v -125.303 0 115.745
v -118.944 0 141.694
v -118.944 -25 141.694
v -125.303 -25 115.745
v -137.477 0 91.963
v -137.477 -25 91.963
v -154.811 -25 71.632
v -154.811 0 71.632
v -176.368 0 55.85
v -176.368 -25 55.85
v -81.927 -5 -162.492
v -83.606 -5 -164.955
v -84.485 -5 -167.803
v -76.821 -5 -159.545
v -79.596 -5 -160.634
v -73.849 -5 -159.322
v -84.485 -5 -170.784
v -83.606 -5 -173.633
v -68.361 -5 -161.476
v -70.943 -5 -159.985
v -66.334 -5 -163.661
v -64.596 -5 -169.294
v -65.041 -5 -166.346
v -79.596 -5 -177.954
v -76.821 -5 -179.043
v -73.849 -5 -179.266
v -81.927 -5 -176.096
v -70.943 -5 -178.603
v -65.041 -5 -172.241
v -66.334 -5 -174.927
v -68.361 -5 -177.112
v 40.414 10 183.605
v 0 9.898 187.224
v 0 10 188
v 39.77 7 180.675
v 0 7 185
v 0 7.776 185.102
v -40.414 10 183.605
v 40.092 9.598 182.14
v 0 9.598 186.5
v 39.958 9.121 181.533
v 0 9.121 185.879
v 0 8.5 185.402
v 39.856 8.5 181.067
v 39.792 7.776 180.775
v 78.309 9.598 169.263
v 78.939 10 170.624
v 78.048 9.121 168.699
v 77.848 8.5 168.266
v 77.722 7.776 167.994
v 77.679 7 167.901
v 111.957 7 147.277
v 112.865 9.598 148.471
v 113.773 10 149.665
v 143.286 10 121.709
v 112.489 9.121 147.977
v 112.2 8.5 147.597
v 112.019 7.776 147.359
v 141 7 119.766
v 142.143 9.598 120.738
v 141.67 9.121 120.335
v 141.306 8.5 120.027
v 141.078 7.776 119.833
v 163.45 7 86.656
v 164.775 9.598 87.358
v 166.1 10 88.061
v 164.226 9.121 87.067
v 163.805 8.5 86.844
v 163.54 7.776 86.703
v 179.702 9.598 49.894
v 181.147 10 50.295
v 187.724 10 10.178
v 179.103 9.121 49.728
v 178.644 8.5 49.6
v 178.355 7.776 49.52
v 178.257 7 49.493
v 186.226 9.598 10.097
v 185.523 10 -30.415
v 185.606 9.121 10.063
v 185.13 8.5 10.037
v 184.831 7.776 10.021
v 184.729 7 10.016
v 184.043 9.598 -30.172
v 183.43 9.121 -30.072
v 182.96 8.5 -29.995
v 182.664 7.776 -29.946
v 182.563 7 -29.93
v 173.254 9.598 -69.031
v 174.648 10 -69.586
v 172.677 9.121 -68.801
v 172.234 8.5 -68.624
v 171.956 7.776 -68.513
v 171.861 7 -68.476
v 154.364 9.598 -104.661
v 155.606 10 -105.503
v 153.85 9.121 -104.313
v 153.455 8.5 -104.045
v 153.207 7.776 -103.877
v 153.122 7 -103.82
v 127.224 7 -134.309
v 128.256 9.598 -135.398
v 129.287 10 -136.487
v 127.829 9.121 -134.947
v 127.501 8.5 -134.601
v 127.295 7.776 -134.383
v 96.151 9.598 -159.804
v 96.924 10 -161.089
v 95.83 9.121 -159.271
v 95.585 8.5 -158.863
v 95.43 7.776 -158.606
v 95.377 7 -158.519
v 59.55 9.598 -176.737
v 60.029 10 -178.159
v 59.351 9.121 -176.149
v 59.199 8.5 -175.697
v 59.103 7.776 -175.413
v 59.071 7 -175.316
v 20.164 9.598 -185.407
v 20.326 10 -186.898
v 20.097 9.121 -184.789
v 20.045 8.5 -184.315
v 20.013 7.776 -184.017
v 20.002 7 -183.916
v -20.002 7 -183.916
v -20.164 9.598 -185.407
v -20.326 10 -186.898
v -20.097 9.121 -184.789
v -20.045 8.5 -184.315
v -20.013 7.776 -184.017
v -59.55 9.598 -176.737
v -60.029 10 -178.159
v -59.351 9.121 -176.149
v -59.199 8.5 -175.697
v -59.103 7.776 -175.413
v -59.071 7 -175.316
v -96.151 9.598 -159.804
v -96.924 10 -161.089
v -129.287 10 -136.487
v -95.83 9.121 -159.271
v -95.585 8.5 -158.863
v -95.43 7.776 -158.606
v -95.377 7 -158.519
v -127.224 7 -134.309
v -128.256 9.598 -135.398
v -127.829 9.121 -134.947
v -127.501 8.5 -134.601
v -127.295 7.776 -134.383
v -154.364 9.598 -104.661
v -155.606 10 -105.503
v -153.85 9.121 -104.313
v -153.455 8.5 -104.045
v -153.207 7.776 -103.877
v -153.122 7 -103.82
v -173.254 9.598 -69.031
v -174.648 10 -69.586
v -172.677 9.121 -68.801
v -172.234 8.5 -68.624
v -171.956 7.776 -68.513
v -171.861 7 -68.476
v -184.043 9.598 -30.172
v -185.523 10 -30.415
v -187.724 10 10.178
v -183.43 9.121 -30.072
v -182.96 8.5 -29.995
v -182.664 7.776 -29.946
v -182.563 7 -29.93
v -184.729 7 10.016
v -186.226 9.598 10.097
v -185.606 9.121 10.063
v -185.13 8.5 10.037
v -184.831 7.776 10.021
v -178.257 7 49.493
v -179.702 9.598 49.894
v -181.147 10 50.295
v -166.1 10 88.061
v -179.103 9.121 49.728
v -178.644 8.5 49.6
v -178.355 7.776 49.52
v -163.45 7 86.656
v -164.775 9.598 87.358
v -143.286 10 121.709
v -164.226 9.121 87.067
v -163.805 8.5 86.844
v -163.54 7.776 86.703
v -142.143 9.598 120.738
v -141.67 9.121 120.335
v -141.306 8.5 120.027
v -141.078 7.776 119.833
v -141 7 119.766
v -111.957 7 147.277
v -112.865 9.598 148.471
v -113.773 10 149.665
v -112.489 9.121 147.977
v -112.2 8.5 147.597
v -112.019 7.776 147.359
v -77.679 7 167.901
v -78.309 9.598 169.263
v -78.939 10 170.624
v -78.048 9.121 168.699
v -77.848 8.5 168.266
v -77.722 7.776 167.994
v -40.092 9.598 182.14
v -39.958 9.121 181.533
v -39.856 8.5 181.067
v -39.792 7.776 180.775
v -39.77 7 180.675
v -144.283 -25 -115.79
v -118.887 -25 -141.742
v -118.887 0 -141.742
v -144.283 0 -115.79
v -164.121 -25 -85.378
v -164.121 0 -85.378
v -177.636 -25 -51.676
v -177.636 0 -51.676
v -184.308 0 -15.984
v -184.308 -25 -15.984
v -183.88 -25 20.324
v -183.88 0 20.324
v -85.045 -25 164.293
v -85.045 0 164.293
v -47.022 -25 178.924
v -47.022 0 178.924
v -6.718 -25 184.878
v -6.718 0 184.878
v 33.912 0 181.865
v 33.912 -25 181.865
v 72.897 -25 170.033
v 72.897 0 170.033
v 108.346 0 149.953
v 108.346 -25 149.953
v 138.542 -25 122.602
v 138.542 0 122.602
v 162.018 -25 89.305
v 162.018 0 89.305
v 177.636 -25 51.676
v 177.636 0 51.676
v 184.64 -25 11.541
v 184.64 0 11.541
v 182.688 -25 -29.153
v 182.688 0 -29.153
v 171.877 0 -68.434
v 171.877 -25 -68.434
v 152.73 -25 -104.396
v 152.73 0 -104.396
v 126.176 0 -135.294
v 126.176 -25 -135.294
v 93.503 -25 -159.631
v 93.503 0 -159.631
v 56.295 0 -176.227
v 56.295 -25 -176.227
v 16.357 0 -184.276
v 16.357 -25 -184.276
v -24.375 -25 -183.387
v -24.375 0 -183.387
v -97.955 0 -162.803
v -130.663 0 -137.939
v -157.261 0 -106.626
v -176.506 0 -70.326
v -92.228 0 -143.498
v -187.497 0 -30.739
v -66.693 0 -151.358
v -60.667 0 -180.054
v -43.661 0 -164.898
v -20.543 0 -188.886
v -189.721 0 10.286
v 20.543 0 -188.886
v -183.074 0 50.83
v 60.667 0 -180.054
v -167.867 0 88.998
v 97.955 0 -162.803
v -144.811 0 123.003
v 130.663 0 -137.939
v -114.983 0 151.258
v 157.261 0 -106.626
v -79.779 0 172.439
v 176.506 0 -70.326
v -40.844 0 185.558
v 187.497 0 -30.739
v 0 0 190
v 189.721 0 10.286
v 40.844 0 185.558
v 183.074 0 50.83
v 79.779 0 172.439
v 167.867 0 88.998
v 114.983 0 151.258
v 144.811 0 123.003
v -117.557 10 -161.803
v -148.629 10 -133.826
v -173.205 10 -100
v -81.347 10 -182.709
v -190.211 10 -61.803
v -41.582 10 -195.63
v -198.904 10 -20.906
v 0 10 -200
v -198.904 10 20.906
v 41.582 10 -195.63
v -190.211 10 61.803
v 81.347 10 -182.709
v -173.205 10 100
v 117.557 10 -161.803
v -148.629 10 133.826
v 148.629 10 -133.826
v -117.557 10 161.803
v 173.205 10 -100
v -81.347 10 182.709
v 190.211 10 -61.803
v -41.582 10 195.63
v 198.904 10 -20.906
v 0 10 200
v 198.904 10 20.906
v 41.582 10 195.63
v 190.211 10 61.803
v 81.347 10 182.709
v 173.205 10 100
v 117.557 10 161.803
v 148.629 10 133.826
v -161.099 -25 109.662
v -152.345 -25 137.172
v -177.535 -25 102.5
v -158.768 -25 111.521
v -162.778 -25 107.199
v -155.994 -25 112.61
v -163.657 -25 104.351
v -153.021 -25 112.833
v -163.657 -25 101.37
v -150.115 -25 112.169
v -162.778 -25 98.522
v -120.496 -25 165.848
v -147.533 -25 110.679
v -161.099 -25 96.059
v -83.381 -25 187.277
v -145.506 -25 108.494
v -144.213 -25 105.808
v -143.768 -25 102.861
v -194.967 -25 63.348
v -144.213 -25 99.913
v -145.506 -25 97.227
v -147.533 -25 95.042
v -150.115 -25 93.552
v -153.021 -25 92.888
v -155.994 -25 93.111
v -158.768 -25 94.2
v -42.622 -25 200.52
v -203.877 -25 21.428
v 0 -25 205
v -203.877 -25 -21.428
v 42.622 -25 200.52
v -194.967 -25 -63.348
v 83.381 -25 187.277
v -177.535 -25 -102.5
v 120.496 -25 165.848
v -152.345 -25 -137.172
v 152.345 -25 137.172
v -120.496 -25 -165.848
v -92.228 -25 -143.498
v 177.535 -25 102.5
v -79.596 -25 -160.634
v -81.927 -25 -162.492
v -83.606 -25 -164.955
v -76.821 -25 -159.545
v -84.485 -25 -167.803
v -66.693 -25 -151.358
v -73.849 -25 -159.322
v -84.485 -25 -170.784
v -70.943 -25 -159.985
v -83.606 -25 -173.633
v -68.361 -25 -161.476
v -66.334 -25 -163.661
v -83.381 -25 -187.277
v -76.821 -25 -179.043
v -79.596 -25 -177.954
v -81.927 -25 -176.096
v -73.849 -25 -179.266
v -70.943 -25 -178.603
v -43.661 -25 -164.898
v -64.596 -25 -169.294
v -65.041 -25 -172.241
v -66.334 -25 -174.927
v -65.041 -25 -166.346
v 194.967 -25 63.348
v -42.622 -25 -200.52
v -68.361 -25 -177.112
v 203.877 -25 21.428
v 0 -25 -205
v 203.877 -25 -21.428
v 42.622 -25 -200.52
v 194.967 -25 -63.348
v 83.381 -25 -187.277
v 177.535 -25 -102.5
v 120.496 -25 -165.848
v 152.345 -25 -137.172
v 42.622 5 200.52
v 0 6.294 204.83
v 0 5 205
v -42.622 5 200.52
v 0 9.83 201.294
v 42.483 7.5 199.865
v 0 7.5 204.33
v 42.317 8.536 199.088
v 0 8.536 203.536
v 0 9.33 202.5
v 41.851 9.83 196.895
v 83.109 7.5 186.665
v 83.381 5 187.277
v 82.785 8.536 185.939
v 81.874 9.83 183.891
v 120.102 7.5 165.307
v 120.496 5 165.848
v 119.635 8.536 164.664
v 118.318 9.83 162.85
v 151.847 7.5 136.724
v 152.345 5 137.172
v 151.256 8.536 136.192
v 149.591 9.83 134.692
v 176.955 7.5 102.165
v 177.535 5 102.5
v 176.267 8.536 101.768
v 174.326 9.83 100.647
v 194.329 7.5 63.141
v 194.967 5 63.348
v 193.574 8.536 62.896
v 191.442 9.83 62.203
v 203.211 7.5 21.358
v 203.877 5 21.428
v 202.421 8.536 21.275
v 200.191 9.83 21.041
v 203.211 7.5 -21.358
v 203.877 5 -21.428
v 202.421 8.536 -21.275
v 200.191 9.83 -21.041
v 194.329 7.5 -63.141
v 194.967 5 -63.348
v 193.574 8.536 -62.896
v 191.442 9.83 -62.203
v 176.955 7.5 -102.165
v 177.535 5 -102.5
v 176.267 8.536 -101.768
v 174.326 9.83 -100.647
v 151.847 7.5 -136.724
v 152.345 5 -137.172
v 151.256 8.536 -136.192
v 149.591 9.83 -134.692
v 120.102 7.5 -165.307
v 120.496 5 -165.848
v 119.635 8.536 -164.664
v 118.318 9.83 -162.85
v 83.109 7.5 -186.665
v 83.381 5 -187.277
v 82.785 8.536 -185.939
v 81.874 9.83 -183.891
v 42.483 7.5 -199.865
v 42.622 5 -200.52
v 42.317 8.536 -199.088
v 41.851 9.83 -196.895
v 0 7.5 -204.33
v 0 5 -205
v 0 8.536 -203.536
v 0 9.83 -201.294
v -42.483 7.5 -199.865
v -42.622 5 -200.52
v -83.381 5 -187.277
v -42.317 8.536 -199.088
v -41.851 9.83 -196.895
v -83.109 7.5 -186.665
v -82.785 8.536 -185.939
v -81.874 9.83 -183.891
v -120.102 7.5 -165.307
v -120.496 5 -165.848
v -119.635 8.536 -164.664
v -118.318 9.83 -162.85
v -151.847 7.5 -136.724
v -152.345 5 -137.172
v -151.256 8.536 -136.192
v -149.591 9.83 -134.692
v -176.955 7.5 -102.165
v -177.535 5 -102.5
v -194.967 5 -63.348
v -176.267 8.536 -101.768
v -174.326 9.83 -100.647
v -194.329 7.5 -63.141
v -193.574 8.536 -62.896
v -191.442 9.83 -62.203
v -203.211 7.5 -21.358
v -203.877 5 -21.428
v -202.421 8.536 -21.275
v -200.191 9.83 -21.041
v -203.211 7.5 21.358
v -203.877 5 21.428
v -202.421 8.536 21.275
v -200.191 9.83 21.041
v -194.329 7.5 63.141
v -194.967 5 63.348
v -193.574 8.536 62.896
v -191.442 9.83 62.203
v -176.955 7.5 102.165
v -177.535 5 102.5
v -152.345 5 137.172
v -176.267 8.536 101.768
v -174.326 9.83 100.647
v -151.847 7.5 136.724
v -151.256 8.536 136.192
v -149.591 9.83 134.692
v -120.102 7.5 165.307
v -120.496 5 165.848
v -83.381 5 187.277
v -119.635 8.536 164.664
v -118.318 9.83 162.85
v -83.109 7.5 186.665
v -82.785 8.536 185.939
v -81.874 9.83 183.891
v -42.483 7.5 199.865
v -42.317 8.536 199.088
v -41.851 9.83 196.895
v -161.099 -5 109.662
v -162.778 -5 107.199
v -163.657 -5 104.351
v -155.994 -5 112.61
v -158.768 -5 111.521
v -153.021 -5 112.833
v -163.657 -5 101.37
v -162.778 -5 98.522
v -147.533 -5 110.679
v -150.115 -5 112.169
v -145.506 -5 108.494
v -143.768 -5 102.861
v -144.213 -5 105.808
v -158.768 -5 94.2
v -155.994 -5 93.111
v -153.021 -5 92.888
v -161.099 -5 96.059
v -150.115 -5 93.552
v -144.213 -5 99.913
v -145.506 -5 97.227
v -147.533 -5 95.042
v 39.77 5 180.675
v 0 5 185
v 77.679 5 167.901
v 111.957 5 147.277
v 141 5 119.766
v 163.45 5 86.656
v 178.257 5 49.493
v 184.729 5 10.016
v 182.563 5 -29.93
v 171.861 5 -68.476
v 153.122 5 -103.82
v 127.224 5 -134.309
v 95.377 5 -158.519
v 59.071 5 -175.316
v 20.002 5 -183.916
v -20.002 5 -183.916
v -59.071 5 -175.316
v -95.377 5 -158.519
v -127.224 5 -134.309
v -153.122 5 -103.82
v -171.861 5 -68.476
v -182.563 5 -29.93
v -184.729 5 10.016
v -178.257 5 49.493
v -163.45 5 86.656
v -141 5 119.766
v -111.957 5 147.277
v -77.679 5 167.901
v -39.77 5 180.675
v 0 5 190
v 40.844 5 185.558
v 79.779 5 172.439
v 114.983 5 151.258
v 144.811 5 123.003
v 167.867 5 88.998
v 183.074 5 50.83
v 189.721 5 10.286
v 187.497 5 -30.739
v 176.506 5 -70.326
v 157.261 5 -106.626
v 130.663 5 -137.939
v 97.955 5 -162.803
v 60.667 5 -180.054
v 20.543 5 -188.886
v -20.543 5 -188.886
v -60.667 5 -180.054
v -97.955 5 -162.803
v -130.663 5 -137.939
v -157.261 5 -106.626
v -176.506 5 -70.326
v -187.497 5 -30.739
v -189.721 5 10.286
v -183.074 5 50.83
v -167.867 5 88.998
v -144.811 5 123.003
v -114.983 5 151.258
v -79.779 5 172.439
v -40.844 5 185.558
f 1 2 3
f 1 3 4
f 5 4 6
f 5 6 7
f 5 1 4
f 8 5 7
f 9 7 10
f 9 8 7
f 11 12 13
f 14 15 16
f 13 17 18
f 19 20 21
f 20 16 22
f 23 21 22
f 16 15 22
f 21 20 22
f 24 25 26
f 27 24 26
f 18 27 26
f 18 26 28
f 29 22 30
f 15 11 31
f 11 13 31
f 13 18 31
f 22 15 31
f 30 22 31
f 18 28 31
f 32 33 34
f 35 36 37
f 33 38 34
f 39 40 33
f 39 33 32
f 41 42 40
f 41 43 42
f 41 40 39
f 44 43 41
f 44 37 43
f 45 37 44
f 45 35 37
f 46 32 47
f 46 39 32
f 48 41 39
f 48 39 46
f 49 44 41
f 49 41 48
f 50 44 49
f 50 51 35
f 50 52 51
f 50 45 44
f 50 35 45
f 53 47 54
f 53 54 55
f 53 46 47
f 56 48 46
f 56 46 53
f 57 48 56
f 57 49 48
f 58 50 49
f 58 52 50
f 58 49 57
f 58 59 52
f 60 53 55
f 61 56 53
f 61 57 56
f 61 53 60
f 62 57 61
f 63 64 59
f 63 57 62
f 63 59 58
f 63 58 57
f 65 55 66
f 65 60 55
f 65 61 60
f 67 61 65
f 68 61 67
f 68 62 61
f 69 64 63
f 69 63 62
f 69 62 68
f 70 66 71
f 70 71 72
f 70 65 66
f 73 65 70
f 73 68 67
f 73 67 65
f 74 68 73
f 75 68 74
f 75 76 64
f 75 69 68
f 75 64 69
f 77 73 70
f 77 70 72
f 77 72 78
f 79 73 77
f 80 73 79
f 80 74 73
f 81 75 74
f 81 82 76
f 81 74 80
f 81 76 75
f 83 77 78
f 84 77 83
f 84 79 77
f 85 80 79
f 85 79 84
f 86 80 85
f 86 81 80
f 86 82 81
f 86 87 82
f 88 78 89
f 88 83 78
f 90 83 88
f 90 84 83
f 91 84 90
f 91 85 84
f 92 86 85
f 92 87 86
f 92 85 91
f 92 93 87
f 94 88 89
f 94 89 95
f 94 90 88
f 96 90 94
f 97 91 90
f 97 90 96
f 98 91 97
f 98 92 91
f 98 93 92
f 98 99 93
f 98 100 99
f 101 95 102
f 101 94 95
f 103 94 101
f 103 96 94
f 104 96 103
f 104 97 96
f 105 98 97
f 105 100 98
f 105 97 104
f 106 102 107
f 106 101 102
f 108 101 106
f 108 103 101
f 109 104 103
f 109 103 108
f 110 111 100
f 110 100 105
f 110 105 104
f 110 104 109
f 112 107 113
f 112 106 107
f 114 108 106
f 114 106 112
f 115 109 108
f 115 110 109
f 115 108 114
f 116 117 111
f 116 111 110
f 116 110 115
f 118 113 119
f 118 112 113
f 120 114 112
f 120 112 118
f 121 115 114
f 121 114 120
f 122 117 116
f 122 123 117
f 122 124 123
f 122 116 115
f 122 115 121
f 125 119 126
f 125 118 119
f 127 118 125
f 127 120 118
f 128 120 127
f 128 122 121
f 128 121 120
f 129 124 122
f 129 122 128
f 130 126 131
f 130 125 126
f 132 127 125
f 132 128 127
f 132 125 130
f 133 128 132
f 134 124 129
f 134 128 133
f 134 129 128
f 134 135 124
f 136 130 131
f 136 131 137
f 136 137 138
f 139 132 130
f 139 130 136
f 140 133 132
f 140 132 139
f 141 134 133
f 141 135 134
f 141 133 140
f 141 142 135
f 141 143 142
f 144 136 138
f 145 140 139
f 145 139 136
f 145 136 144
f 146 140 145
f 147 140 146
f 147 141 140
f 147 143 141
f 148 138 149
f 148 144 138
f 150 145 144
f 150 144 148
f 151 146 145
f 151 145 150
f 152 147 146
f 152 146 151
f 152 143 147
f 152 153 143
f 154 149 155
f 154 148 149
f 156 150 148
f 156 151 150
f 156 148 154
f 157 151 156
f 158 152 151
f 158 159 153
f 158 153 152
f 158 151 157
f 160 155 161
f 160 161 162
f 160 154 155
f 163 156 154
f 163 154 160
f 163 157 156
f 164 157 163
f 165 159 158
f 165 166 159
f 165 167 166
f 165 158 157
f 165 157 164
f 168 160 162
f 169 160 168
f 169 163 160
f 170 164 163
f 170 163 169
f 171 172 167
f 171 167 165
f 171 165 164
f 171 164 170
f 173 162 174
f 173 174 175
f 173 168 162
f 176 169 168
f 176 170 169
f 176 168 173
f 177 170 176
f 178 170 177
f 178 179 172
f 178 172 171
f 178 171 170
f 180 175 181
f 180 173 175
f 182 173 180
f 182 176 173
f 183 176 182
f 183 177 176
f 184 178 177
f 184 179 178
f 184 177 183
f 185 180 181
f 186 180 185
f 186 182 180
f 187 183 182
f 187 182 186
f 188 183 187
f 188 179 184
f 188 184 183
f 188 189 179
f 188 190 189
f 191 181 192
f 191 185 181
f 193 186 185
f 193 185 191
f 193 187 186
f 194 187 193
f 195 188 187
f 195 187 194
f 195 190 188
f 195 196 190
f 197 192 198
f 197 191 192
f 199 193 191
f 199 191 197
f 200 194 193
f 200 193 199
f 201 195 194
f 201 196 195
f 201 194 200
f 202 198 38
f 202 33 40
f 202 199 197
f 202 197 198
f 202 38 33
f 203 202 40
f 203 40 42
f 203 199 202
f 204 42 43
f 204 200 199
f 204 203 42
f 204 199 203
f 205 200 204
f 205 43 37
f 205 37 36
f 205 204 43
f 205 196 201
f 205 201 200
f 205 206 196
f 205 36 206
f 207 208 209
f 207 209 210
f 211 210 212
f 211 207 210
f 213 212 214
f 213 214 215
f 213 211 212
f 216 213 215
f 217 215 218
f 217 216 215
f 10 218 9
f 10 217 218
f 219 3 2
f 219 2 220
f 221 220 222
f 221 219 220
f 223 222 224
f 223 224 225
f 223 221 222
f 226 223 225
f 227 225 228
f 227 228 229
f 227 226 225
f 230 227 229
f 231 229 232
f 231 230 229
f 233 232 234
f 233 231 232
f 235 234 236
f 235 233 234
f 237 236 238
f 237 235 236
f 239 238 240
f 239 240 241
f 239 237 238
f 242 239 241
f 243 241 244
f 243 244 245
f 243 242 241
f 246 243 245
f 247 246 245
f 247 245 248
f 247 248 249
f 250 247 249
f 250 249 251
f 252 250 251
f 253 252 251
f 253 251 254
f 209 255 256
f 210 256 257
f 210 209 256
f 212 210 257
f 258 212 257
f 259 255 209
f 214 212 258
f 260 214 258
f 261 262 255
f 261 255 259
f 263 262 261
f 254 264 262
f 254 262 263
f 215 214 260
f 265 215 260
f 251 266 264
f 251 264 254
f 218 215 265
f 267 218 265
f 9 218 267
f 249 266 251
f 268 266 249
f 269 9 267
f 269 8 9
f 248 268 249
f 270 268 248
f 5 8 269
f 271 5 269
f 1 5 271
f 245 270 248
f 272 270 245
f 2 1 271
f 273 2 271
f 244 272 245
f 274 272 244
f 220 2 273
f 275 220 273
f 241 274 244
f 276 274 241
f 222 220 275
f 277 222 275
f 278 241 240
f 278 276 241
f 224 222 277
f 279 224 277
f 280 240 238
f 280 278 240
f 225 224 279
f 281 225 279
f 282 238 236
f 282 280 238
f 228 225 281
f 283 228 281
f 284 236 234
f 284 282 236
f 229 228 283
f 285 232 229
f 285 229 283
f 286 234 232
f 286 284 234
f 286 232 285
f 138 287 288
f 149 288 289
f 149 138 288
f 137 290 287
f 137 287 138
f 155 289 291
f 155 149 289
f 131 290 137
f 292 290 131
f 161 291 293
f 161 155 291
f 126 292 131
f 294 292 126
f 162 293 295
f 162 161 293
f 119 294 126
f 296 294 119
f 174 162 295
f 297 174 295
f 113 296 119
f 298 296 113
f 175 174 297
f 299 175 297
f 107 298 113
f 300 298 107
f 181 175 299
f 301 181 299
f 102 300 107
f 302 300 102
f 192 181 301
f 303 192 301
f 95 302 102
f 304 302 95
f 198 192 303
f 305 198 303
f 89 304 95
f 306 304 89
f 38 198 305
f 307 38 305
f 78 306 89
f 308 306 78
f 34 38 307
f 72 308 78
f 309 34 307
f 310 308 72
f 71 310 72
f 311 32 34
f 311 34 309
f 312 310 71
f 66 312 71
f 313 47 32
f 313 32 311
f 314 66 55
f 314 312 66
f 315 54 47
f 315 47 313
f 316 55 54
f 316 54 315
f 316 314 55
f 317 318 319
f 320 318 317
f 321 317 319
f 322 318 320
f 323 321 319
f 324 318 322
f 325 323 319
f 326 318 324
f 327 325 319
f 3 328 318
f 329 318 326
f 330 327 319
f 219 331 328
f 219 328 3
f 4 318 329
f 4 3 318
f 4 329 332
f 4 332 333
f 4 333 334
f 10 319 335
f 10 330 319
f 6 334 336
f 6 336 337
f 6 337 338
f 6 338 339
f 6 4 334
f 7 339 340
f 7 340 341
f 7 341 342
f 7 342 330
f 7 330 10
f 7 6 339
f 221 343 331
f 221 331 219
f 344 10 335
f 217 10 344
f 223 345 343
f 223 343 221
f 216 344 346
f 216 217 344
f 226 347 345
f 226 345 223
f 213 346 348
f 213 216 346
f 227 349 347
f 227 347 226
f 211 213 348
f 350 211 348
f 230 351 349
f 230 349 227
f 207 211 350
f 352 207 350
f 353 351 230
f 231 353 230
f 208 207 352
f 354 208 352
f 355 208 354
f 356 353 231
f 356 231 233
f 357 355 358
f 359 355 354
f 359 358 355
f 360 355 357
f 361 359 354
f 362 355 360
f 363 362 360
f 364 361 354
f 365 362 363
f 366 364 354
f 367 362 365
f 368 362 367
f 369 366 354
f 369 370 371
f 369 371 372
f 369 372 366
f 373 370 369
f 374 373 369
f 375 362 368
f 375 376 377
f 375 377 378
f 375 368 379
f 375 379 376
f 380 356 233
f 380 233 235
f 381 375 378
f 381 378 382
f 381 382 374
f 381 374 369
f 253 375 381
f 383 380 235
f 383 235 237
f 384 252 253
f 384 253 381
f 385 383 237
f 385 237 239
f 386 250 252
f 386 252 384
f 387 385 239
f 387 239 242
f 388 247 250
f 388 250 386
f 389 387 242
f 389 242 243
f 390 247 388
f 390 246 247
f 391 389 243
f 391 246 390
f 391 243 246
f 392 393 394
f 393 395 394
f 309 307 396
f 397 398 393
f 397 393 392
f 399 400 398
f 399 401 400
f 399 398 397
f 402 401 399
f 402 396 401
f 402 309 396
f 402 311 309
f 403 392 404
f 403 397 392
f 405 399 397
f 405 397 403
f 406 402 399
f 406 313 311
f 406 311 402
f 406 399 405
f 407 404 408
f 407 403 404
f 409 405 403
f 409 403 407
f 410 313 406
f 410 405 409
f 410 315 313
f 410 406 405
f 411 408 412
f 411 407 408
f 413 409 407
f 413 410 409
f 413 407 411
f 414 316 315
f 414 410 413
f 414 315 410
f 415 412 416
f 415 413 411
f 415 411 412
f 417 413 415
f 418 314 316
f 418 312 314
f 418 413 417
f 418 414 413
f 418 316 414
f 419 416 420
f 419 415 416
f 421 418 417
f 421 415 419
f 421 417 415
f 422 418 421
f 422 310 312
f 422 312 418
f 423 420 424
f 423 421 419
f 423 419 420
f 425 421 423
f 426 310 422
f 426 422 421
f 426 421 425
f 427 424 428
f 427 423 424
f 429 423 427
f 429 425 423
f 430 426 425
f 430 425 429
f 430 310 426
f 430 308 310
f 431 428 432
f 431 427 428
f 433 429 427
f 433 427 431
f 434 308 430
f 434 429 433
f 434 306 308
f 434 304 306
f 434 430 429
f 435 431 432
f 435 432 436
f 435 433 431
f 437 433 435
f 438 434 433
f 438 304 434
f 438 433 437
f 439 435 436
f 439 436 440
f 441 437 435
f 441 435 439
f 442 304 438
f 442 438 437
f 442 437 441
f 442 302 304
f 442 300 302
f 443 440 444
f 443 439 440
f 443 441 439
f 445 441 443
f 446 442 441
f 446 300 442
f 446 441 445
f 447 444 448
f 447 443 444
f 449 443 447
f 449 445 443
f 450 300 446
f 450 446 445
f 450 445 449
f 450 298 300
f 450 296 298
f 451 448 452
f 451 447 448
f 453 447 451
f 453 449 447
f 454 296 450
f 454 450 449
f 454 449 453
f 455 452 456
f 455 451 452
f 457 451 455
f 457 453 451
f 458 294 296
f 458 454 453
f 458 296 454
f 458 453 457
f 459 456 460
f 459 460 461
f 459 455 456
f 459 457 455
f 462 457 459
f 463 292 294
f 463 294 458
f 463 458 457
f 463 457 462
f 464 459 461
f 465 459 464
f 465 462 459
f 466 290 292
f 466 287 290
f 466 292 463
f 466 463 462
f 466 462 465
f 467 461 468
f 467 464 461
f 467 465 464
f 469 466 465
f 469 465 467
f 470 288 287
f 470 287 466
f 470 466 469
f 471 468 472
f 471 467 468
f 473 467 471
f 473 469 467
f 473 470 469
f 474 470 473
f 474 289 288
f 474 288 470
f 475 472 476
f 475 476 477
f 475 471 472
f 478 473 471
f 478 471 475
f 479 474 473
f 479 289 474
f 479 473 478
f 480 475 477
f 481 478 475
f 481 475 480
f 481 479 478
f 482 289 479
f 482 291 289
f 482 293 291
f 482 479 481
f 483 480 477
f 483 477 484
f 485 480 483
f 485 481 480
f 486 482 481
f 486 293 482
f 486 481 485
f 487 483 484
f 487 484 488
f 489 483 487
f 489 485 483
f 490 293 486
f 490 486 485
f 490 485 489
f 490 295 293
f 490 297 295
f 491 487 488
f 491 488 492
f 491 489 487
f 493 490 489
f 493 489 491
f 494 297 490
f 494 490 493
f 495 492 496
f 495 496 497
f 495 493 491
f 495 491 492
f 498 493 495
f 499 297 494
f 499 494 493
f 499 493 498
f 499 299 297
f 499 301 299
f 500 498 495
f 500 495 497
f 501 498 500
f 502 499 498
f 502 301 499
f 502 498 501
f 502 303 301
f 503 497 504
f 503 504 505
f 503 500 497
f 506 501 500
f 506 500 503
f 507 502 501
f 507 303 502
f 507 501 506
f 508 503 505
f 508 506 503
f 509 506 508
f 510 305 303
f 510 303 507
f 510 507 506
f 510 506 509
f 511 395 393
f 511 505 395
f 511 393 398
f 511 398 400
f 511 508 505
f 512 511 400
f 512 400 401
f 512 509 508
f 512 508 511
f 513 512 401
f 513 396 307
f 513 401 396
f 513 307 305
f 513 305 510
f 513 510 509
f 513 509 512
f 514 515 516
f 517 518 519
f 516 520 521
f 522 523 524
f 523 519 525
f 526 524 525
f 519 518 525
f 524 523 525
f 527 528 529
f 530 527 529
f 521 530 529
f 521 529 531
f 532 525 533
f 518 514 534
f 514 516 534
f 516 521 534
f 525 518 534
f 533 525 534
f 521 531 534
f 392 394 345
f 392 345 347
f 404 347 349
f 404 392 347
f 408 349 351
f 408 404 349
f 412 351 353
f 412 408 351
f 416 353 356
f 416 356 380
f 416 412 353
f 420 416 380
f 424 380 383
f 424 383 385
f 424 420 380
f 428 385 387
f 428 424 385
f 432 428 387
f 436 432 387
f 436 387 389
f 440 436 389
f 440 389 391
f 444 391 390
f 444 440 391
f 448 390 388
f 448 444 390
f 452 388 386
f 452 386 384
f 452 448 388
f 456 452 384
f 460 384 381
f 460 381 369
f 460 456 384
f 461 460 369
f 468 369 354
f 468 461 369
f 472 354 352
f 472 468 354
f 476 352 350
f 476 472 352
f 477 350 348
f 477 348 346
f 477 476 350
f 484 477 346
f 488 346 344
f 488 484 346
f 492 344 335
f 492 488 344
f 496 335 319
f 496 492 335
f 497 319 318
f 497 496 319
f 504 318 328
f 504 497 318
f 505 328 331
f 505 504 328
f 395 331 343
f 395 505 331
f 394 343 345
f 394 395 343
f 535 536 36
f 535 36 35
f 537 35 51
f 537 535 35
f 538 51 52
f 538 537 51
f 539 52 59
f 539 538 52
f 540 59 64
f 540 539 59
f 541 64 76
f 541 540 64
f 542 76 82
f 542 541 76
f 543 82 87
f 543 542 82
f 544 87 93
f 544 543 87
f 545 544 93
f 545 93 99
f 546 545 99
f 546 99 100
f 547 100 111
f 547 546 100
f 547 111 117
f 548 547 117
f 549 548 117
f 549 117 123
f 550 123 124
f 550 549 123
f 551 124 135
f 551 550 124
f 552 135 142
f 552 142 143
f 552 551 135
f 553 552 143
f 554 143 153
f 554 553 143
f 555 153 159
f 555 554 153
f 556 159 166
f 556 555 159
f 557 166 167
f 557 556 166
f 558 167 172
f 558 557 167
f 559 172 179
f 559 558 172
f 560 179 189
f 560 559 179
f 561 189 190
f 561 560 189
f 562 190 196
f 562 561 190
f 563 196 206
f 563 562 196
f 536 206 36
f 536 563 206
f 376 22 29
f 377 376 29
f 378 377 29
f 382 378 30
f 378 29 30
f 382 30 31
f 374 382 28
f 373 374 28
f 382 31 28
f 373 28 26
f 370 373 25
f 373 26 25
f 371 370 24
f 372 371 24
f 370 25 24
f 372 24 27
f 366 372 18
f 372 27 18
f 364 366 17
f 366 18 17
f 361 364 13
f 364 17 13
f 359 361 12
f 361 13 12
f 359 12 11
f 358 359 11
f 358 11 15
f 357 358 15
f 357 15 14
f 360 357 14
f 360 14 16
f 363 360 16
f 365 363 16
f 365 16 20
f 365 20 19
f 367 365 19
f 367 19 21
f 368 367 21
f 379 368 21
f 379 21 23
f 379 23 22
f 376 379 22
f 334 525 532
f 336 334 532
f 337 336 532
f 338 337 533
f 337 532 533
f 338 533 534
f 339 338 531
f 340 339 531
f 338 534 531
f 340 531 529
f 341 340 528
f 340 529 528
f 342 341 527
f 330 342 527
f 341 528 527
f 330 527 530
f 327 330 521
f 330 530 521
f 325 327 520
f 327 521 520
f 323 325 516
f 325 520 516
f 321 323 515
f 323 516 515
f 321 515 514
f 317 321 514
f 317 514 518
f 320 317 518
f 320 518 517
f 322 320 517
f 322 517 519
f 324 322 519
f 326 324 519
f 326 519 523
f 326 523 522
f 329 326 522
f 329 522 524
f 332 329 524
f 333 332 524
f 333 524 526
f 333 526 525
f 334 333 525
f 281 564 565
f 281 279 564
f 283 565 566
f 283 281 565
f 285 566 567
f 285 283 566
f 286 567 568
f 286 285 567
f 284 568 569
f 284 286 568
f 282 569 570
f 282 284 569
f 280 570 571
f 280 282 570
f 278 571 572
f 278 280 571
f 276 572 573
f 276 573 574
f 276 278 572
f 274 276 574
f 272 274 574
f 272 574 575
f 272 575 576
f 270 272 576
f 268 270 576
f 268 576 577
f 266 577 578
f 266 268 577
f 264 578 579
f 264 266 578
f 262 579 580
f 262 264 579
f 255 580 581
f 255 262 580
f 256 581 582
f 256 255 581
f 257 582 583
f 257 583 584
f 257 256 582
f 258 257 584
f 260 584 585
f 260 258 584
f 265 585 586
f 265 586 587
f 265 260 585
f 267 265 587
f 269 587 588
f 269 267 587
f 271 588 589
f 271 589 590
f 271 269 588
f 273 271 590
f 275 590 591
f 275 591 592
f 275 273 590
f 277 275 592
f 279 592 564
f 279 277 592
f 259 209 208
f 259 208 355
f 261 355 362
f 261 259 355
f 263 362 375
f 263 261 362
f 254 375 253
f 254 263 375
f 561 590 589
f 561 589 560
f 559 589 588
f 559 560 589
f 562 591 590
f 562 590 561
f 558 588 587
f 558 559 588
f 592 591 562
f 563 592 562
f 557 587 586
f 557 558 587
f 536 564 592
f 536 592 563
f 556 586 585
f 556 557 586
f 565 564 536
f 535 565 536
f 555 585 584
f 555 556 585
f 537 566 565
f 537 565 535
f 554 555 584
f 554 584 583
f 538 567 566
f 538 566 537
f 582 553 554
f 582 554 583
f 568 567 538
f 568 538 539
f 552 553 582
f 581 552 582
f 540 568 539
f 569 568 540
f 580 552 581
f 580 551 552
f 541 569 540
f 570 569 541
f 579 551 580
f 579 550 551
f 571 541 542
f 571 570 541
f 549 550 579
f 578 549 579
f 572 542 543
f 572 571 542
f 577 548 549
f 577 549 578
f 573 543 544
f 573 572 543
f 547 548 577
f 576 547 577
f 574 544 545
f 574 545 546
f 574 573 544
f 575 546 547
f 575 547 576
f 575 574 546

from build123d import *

# Parameters (mm, degrees)
FILLET1_R           = 5
FILLET2_R           = 3
BOSS_EXTRUDE1_DEPTH = 25
CUT_EXTRUDE3_START  = -5
SKETCH24_R          = 10
CUT_EXTRUDE3_DEPTH  = 21


with BuildPart() as part:
    # Sketch2 → Revolve1 (revolve)
    with BuildSketch(Plane(origin=(0, 0, 0), x_dir=(0, 0, -1), z_dir=(1, 0, 0))):
        Polygon((-185, -25), (-205, -25), (-205, 10), (-185, 10), (-185, 5), (-190, 5), (-190, 0), (-185, 0), align=None)
    revolve(axis=Axis((0, 0, 0), (0, 1, 0)))

    # Fillet1
    fillet1_edges = [part.edges().sort_by_distance(p)[0] for p in [
        (0, 10, -205),
    ]]
    fillet(fillet1_edges, radius=FILLET1_R)

    # Fillet2
    fillet2_edges = [part.edges().sort_by_distance(p)[0] for p in [
        (0, 10, -185),
    ]]
    fillet(fillet2_edges, radius=FILLET2_R)

    # Sketch15 → Boss-Extrude1 (add)
    with BuildSketch(Plane(origin=(0, 0, 0), x_dir=(1, 0, 0), z_dir=(0, 1, 0))):
        with BuildLine():
            ThreePointArc((-118.887266817, 141.742081926), (-66.69307667, 151.357832715), (-24.375030373, 183.387180289))
            ThreePointArc((-24.375030373, 183.387180289), (-74.596246578, 169.293827402), (-118.887266817, 141.742081926))
        make_face()
        with BuildLine():
            ThreePointArc((-118.944143978, -141.694356321), (-137.477235911, -91.962870803), (-176.368437347, -55.849568556))
            ThreePointArc((-176.368437347, -55.849568556), (-153.768371484, -102.860526594), (-118.944143978, -141.694356321))
        make_face()
    extrude(amount=-BOSS_EXTRUDE1_DEPTH)

    # Sketch24 → Cut-Extrude3 (cut, through all)
    with BuildSketch(Plane(origin=(0, 0, 0), x_dir=(1, 0, 0), z_dir=(0, 1, 0)).offset(CUT_EXTRUDE3_START)):
        with Locations((-74.596246578, 169.293827402)):
            Circle(SKETCH24_R)
        with Locations((-153.768371484, -102.860526594)):
            Circle(SKETCH24_R)
    extrude(amount=-CUT_EXTRUDE3_DEPTH, mode=Mode.SUBTRACT)


solid = part.part
